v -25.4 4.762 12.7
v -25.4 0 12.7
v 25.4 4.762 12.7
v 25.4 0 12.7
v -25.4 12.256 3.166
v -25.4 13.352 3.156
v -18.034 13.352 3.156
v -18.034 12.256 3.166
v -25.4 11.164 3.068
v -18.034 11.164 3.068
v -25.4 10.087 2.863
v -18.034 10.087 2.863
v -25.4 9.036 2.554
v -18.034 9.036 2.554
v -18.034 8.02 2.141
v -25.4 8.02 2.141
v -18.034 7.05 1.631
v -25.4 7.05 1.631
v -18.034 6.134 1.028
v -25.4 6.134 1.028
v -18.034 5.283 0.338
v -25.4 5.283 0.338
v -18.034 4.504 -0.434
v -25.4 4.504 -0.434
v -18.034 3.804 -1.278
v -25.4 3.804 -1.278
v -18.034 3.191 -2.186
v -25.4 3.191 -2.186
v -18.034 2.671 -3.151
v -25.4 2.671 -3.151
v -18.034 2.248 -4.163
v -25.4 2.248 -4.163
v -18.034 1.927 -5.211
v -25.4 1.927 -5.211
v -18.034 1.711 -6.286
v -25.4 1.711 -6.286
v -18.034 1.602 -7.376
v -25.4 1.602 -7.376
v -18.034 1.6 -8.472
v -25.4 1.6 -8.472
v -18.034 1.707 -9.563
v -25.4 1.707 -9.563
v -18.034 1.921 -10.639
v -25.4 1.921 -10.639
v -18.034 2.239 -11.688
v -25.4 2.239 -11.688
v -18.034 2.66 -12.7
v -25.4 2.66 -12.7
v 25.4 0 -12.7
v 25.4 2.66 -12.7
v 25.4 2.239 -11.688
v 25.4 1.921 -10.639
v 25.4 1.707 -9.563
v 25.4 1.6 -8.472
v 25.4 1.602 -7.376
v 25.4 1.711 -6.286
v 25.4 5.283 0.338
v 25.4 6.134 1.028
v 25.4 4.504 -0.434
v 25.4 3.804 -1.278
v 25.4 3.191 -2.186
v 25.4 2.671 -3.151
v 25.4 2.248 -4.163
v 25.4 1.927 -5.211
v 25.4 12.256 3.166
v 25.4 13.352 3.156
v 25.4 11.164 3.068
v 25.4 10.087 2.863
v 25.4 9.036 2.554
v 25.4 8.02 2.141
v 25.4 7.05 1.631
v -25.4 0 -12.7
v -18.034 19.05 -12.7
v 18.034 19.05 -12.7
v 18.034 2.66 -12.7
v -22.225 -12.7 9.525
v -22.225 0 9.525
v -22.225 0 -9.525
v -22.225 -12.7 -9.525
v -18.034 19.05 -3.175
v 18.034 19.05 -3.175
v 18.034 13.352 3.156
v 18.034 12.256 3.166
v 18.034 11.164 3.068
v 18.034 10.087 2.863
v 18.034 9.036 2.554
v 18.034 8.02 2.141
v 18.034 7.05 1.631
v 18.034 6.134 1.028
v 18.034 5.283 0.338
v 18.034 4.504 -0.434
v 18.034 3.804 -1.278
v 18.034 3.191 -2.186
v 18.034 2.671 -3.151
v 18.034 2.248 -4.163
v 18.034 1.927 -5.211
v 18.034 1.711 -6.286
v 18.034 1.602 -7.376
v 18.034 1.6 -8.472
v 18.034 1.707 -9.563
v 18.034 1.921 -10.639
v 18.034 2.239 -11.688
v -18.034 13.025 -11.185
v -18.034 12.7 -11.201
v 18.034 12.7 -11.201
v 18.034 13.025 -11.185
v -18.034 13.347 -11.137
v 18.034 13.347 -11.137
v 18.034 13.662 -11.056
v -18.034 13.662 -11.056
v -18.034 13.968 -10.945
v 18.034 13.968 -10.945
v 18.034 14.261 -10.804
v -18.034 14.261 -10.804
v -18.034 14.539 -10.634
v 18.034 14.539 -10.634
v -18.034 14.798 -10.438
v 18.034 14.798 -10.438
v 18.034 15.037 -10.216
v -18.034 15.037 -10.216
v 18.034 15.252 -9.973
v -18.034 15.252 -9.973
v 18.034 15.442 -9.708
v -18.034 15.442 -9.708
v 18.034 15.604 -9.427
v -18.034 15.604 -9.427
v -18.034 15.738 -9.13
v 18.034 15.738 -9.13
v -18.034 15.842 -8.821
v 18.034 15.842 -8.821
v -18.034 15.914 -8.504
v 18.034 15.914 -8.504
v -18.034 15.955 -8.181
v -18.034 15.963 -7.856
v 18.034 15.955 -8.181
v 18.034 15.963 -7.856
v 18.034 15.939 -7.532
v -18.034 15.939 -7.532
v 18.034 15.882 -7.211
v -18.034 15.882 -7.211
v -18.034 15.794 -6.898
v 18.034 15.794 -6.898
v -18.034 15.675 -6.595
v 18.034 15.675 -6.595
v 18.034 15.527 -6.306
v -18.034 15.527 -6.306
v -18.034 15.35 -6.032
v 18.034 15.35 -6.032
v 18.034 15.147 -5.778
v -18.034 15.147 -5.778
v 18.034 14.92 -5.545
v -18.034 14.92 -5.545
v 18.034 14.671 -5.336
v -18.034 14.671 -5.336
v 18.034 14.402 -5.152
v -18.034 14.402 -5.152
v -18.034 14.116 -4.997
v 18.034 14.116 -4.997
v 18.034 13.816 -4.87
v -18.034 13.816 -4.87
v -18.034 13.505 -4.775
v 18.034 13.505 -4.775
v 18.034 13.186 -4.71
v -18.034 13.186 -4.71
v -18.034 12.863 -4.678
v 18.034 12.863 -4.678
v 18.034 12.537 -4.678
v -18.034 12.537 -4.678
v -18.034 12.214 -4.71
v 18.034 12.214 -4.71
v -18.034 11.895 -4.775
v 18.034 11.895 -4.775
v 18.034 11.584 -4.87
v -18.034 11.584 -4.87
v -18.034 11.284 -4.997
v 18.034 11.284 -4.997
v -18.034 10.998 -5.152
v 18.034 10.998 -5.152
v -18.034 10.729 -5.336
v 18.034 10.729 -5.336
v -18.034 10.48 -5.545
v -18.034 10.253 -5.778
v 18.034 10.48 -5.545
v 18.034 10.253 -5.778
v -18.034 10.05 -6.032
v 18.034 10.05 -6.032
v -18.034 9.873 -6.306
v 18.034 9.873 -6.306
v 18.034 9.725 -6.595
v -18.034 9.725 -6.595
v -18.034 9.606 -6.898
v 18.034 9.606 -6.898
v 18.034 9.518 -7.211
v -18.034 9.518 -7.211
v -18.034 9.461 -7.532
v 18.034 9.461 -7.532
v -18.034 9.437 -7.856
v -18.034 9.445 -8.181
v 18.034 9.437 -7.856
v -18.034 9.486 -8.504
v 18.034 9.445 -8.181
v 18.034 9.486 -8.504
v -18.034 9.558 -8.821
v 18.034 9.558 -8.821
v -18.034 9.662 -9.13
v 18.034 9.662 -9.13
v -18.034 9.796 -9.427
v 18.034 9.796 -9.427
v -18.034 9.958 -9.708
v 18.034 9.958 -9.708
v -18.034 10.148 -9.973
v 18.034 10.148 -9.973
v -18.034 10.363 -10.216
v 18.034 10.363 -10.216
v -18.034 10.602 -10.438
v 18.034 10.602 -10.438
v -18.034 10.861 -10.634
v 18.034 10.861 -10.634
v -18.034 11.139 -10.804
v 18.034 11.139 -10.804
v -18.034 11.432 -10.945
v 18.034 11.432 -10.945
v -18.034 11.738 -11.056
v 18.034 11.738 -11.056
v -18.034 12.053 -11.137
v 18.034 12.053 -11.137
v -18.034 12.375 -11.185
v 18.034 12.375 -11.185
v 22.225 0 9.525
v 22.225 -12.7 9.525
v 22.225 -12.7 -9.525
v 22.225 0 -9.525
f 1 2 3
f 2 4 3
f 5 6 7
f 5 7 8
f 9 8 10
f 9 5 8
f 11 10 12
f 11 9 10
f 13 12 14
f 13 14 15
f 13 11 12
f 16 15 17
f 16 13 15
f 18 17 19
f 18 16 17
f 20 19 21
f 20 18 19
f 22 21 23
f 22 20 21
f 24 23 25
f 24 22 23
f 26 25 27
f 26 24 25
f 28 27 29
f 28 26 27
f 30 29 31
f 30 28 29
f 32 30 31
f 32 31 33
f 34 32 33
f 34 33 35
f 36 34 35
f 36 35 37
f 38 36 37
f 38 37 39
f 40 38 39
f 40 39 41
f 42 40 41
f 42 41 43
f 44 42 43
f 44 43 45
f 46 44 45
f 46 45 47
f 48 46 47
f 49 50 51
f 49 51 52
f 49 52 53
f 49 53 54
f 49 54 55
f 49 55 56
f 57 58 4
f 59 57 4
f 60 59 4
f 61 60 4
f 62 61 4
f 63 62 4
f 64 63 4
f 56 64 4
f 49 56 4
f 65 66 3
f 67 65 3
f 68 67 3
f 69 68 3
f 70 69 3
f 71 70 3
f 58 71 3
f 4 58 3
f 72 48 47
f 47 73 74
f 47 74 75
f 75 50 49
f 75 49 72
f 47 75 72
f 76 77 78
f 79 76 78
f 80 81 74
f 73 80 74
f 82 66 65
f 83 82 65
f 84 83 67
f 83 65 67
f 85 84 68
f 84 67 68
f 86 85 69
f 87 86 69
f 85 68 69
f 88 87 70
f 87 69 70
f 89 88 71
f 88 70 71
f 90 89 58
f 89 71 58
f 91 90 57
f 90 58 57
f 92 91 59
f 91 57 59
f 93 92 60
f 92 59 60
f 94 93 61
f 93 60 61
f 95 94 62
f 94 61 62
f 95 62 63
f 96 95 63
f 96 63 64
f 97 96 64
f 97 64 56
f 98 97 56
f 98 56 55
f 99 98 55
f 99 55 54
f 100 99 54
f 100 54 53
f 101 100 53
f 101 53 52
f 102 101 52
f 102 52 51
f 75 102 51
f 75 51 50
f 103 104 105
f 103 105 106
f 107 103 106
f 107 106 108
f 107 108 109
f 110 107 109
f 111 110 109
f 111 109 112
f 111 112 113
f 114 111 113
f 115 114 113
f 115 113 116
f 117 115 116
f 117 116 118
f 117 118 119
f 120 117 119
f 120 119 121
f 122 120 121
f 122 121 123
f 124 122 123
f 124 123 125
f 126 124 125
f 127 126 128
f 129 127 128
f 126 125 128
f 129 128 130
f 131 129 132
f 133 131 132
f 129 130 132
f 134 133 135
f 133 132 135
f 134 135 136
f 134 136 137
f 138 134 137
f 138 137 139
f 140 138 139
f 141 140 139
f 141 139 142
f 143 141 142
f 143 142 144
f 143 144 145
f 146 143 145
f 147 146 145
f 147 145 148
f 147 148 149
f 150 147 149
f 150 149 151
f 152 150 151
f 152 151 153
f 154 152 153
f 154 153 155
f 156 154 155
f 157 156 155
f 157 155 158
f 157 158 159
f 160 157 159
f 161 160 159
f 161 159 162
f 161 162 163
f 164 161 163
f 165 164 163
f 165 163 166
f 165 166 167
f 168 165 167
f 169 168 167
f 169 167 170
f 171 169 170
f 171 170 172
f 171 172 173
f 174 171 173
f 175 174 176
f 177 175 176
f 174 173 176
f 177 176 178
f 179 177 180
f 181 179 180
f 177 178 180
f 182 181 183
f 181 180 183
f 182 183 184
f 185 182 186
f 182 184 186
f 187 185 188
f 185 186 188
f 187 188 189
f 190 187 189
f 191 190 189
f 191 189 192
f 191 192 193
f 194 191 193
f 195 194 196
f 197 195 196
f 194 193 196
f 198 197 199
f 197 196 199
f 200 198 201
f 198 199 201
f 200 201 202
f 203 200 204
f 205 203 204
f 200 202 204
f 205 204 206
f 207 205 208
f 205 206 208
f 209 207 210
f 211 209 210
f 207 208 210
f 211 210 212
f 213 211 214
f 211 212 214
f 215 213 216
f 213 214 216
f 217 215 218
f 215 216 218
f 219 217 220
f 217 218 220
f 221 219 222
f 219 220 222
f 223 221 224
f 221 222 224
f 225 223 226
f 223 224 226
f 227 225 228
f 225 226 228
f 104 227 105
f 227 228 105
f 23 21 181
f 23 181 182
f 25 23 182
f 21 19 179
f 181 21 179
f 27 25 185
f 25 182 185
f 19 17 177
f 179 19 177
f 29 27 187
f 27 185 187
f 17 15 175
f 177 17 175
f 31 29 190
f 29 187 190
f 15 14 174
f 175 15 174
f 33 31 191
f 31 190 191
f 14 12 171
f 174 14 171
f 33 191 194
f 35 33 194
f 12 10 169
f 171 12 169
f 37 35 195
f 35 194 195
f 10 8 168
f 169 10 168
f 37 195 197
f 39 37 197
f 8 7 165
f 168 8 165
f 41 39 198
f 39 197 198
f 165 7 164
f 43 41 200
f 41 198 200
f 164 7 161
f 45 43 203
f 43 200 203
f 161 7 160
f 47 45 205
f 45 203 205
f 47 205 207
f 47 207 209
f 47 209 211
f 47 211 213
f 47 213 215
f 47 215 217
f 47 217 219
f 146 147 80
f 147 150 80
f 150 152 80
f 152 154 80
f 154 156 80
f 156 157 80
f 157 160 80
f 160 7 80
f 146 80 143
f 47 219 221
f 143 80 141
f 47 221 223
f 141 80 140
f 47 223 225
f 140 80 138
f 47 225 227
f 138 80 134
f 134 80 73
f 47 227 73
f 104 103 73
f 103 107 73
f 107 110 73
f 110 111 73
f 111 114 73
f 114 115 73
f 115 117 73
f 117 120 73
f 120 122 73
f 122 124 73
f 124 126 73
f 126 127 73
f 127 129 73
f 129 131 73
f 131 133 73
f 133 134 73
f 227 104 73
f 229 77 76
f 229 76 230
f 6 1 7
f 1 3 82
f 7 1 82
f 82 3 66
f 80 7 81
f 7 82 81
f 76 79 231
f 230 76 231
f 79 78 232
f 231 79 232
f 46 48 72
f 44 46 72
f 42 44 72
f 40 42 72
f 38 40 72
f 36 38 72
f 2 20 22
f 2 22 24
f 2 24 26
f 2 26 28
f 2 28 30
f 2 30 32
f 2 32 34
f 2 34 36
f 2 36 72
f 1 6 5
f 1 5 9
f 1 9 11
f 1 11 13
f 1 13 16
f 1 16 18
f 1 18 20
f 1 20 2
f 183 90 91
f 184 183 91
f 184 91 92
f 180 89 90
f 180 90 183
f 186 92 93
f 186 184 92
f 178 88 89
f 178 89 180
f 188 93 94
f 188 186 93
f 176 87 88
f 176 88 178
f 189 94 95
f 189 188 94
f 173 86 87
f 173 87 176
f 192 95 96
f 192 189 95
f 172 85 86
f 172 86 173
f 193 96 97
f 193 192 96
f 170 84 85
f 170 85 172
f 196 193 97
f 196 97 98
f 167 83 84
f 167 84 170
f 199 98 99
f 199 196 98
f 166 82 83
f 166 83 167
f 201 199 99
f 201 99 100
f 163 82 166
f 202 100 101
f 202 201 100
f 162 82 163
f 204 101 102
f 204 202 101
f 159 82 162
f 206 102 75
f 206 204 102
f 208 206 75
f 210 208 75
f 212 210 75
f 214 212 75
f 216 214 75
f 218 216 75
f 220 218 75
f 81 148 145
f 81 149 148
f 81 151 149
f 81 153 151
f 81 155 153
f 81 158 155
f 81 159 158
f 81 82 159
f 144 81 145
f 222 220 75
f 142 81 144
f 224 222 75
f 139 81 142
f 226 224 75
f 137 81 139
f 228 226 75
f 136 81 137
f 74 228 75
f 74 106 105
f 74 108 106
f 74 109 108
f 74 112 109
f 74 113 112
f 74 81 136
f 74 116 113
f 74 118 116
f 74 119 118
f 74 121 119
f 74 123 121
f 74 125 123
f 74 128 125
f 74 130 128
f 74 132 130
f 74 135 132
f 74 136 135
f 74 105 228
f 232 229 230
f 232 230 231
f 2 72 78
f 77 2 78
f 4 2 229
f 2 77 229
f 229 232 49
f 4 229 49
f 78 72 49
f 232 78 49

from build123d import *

# Parameters (mm, degrees)
SKETCH2_W           = 44.45
SKETCH2_H           = 19.05
BOSS_EXTRUDE1_DEPTH = 12.7
SKETCH3_W           = 50.8
SKETCH3_H           = 25.4
BOSS_EXTRUDE2_DEPTH = 3.175
BOSS_EXTRUDE3_DEPTH = 25.4
SKETCH5_R           = 11.1125
CUT_EXTRUDE1_DEPTH  = 7.366
SKETCH6_R           = 3.2639
CUT_EXTRUDE2_DEPTH  = 50.098929275


with BuildPart() as part:
    # Sketch2 → Boss-Extrude1 (new body)
    with BuildSketch(Plane(origin=(0, 0, 0), x_dir=(1, 0, 0), z_dir=(0, 1, 0))):
        Rectangle(SKETCH2_W, SKETCH2_H)
    extrude(amount=-BOSS_EXTRUDE1_DEPTH)

    # Sketch3 → Boss-Extrude2 (add)
    with BuildSketch(Plane(origin=(0, 0, 0), x_dir=(1, 0, 0), z_dir=(0, 1, 0))):
        Rectangle(SKETCH3_W, SKETCH3_H)
    extrude(amount=BOSS_EXTRUDE2_DEPTH)

    # Sketch4 → Boss-Extrude3 (add, symmetric)
    with BuildSketch(Plane(origin=(0, 0, 0), x_dir=(0, 0, -1), z_dir=(1, 0, 0))):
        Polygon((-12.7, 3.175), (-12.7, 4.7625), (3.175, 19.05), (12.7, 19.05), (12.7, 3.175), align=None)
    extrude(amount=BOSS_EXTRUDE3_DEPTH, both=True)

    # Sketch5 → Cut-Extrude1 (cut)
    with BuildSketch(Plane(origin=(25.4, 0, 0), x_dir=(0, 0, -1), z_dir=(1, 0, 0))):
        with Locations((7.9375, 12.7)):
            Circle(SKETCH5_R)
    cut_extrude1 = extrude(amount=-CUT_EXTRUDE1_DEPTH, mode=Mode.SUBTRACT)

    # Sketch6 → Cut-Extrude2 (cut, through all)
    with BuildSketch(Plane(origin=(18.034, 0, 0), x_dir=(0, 0, -1), z_dir=(1, 0, 0))):
        with Locations((7.9375, 12.7)):
            Circle(SKETCH6_R)
    extrude(amount=-CUT_EXTRUDE2_DEPTH, mode=Mode.SUBTRACT)

    # Mirror1: Cut-Extrude1 across plane
    add(cut_extrude1.mirror(Plane(origin=(0, 0, 0), x_dir=(0, 0, 1), z_dir=(1, 0, 0))), mode=Mode.SUBTRACT)


solid = part.part
